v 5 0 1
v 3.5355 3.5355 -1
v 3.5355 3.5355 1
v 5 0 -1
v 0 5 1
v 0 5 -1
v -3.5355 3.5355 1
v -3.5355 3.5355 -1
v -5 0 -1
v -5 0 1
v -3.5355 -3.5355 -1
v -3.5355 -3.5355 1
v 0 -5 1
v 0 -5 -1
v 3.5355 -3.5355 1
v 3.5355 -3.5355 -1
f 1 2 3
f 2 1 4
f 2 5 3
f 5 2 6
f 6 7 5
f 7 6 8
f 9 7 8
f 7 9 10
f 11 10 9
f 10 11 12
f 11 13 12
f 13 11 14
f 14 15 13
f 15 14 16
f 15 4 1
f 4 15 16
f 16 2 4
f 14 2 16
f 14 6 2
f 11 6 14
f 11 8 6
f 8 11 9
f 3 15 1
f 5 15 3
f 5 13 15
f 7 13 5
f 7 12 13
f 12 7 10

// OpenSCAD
// file: base.scad
// Selftest fixture for scripts/lineage.sh — never printed, never gated as a
// design. Rendered only so `./scripts/lineage.sh selftest` can prove the
// derivative gate in scripts/gate.sh can still tell a working override from a
// silently-broken one on whatever OpenSCAD this machine has.
//
// This is an ordinary entry point, shaped like every design in designs/: it
// defines a module and calls it at the top level. It plays two parts in the
// selftest — the mesh a derivative's override has to differ from, and the
// NOT-base-safe half of the base-safety proof, since its top level emits
// geometry that a diamond would evaluate and union twice.

// Coarse on purpose: these renders exist to be hashed, not looked at, and a
// smooth cylinder would only make the selftest slower.
$fn = 8;

module lid() {
    cube([10, 10, 2], center = true);
}

lid();
// main file
// Selftest fixture for scripts/lineage.sh: an override that really binds.
//
// `include` pulls in base.scad's definitions AND its top-level call; redefining
// lid() afterwards reroutes the base's own call site to this version, so the
// rendered mesh is this cylinder and not the base's cube. That difference is
// the only evidence an override took, so the selftest asserts the two meshes
// hash differently — i.e. that gate.sh's override check can recognise success.

include <base.scad>

module lid() {
    cylinder(h = 2, r = 5, center = true);
}
